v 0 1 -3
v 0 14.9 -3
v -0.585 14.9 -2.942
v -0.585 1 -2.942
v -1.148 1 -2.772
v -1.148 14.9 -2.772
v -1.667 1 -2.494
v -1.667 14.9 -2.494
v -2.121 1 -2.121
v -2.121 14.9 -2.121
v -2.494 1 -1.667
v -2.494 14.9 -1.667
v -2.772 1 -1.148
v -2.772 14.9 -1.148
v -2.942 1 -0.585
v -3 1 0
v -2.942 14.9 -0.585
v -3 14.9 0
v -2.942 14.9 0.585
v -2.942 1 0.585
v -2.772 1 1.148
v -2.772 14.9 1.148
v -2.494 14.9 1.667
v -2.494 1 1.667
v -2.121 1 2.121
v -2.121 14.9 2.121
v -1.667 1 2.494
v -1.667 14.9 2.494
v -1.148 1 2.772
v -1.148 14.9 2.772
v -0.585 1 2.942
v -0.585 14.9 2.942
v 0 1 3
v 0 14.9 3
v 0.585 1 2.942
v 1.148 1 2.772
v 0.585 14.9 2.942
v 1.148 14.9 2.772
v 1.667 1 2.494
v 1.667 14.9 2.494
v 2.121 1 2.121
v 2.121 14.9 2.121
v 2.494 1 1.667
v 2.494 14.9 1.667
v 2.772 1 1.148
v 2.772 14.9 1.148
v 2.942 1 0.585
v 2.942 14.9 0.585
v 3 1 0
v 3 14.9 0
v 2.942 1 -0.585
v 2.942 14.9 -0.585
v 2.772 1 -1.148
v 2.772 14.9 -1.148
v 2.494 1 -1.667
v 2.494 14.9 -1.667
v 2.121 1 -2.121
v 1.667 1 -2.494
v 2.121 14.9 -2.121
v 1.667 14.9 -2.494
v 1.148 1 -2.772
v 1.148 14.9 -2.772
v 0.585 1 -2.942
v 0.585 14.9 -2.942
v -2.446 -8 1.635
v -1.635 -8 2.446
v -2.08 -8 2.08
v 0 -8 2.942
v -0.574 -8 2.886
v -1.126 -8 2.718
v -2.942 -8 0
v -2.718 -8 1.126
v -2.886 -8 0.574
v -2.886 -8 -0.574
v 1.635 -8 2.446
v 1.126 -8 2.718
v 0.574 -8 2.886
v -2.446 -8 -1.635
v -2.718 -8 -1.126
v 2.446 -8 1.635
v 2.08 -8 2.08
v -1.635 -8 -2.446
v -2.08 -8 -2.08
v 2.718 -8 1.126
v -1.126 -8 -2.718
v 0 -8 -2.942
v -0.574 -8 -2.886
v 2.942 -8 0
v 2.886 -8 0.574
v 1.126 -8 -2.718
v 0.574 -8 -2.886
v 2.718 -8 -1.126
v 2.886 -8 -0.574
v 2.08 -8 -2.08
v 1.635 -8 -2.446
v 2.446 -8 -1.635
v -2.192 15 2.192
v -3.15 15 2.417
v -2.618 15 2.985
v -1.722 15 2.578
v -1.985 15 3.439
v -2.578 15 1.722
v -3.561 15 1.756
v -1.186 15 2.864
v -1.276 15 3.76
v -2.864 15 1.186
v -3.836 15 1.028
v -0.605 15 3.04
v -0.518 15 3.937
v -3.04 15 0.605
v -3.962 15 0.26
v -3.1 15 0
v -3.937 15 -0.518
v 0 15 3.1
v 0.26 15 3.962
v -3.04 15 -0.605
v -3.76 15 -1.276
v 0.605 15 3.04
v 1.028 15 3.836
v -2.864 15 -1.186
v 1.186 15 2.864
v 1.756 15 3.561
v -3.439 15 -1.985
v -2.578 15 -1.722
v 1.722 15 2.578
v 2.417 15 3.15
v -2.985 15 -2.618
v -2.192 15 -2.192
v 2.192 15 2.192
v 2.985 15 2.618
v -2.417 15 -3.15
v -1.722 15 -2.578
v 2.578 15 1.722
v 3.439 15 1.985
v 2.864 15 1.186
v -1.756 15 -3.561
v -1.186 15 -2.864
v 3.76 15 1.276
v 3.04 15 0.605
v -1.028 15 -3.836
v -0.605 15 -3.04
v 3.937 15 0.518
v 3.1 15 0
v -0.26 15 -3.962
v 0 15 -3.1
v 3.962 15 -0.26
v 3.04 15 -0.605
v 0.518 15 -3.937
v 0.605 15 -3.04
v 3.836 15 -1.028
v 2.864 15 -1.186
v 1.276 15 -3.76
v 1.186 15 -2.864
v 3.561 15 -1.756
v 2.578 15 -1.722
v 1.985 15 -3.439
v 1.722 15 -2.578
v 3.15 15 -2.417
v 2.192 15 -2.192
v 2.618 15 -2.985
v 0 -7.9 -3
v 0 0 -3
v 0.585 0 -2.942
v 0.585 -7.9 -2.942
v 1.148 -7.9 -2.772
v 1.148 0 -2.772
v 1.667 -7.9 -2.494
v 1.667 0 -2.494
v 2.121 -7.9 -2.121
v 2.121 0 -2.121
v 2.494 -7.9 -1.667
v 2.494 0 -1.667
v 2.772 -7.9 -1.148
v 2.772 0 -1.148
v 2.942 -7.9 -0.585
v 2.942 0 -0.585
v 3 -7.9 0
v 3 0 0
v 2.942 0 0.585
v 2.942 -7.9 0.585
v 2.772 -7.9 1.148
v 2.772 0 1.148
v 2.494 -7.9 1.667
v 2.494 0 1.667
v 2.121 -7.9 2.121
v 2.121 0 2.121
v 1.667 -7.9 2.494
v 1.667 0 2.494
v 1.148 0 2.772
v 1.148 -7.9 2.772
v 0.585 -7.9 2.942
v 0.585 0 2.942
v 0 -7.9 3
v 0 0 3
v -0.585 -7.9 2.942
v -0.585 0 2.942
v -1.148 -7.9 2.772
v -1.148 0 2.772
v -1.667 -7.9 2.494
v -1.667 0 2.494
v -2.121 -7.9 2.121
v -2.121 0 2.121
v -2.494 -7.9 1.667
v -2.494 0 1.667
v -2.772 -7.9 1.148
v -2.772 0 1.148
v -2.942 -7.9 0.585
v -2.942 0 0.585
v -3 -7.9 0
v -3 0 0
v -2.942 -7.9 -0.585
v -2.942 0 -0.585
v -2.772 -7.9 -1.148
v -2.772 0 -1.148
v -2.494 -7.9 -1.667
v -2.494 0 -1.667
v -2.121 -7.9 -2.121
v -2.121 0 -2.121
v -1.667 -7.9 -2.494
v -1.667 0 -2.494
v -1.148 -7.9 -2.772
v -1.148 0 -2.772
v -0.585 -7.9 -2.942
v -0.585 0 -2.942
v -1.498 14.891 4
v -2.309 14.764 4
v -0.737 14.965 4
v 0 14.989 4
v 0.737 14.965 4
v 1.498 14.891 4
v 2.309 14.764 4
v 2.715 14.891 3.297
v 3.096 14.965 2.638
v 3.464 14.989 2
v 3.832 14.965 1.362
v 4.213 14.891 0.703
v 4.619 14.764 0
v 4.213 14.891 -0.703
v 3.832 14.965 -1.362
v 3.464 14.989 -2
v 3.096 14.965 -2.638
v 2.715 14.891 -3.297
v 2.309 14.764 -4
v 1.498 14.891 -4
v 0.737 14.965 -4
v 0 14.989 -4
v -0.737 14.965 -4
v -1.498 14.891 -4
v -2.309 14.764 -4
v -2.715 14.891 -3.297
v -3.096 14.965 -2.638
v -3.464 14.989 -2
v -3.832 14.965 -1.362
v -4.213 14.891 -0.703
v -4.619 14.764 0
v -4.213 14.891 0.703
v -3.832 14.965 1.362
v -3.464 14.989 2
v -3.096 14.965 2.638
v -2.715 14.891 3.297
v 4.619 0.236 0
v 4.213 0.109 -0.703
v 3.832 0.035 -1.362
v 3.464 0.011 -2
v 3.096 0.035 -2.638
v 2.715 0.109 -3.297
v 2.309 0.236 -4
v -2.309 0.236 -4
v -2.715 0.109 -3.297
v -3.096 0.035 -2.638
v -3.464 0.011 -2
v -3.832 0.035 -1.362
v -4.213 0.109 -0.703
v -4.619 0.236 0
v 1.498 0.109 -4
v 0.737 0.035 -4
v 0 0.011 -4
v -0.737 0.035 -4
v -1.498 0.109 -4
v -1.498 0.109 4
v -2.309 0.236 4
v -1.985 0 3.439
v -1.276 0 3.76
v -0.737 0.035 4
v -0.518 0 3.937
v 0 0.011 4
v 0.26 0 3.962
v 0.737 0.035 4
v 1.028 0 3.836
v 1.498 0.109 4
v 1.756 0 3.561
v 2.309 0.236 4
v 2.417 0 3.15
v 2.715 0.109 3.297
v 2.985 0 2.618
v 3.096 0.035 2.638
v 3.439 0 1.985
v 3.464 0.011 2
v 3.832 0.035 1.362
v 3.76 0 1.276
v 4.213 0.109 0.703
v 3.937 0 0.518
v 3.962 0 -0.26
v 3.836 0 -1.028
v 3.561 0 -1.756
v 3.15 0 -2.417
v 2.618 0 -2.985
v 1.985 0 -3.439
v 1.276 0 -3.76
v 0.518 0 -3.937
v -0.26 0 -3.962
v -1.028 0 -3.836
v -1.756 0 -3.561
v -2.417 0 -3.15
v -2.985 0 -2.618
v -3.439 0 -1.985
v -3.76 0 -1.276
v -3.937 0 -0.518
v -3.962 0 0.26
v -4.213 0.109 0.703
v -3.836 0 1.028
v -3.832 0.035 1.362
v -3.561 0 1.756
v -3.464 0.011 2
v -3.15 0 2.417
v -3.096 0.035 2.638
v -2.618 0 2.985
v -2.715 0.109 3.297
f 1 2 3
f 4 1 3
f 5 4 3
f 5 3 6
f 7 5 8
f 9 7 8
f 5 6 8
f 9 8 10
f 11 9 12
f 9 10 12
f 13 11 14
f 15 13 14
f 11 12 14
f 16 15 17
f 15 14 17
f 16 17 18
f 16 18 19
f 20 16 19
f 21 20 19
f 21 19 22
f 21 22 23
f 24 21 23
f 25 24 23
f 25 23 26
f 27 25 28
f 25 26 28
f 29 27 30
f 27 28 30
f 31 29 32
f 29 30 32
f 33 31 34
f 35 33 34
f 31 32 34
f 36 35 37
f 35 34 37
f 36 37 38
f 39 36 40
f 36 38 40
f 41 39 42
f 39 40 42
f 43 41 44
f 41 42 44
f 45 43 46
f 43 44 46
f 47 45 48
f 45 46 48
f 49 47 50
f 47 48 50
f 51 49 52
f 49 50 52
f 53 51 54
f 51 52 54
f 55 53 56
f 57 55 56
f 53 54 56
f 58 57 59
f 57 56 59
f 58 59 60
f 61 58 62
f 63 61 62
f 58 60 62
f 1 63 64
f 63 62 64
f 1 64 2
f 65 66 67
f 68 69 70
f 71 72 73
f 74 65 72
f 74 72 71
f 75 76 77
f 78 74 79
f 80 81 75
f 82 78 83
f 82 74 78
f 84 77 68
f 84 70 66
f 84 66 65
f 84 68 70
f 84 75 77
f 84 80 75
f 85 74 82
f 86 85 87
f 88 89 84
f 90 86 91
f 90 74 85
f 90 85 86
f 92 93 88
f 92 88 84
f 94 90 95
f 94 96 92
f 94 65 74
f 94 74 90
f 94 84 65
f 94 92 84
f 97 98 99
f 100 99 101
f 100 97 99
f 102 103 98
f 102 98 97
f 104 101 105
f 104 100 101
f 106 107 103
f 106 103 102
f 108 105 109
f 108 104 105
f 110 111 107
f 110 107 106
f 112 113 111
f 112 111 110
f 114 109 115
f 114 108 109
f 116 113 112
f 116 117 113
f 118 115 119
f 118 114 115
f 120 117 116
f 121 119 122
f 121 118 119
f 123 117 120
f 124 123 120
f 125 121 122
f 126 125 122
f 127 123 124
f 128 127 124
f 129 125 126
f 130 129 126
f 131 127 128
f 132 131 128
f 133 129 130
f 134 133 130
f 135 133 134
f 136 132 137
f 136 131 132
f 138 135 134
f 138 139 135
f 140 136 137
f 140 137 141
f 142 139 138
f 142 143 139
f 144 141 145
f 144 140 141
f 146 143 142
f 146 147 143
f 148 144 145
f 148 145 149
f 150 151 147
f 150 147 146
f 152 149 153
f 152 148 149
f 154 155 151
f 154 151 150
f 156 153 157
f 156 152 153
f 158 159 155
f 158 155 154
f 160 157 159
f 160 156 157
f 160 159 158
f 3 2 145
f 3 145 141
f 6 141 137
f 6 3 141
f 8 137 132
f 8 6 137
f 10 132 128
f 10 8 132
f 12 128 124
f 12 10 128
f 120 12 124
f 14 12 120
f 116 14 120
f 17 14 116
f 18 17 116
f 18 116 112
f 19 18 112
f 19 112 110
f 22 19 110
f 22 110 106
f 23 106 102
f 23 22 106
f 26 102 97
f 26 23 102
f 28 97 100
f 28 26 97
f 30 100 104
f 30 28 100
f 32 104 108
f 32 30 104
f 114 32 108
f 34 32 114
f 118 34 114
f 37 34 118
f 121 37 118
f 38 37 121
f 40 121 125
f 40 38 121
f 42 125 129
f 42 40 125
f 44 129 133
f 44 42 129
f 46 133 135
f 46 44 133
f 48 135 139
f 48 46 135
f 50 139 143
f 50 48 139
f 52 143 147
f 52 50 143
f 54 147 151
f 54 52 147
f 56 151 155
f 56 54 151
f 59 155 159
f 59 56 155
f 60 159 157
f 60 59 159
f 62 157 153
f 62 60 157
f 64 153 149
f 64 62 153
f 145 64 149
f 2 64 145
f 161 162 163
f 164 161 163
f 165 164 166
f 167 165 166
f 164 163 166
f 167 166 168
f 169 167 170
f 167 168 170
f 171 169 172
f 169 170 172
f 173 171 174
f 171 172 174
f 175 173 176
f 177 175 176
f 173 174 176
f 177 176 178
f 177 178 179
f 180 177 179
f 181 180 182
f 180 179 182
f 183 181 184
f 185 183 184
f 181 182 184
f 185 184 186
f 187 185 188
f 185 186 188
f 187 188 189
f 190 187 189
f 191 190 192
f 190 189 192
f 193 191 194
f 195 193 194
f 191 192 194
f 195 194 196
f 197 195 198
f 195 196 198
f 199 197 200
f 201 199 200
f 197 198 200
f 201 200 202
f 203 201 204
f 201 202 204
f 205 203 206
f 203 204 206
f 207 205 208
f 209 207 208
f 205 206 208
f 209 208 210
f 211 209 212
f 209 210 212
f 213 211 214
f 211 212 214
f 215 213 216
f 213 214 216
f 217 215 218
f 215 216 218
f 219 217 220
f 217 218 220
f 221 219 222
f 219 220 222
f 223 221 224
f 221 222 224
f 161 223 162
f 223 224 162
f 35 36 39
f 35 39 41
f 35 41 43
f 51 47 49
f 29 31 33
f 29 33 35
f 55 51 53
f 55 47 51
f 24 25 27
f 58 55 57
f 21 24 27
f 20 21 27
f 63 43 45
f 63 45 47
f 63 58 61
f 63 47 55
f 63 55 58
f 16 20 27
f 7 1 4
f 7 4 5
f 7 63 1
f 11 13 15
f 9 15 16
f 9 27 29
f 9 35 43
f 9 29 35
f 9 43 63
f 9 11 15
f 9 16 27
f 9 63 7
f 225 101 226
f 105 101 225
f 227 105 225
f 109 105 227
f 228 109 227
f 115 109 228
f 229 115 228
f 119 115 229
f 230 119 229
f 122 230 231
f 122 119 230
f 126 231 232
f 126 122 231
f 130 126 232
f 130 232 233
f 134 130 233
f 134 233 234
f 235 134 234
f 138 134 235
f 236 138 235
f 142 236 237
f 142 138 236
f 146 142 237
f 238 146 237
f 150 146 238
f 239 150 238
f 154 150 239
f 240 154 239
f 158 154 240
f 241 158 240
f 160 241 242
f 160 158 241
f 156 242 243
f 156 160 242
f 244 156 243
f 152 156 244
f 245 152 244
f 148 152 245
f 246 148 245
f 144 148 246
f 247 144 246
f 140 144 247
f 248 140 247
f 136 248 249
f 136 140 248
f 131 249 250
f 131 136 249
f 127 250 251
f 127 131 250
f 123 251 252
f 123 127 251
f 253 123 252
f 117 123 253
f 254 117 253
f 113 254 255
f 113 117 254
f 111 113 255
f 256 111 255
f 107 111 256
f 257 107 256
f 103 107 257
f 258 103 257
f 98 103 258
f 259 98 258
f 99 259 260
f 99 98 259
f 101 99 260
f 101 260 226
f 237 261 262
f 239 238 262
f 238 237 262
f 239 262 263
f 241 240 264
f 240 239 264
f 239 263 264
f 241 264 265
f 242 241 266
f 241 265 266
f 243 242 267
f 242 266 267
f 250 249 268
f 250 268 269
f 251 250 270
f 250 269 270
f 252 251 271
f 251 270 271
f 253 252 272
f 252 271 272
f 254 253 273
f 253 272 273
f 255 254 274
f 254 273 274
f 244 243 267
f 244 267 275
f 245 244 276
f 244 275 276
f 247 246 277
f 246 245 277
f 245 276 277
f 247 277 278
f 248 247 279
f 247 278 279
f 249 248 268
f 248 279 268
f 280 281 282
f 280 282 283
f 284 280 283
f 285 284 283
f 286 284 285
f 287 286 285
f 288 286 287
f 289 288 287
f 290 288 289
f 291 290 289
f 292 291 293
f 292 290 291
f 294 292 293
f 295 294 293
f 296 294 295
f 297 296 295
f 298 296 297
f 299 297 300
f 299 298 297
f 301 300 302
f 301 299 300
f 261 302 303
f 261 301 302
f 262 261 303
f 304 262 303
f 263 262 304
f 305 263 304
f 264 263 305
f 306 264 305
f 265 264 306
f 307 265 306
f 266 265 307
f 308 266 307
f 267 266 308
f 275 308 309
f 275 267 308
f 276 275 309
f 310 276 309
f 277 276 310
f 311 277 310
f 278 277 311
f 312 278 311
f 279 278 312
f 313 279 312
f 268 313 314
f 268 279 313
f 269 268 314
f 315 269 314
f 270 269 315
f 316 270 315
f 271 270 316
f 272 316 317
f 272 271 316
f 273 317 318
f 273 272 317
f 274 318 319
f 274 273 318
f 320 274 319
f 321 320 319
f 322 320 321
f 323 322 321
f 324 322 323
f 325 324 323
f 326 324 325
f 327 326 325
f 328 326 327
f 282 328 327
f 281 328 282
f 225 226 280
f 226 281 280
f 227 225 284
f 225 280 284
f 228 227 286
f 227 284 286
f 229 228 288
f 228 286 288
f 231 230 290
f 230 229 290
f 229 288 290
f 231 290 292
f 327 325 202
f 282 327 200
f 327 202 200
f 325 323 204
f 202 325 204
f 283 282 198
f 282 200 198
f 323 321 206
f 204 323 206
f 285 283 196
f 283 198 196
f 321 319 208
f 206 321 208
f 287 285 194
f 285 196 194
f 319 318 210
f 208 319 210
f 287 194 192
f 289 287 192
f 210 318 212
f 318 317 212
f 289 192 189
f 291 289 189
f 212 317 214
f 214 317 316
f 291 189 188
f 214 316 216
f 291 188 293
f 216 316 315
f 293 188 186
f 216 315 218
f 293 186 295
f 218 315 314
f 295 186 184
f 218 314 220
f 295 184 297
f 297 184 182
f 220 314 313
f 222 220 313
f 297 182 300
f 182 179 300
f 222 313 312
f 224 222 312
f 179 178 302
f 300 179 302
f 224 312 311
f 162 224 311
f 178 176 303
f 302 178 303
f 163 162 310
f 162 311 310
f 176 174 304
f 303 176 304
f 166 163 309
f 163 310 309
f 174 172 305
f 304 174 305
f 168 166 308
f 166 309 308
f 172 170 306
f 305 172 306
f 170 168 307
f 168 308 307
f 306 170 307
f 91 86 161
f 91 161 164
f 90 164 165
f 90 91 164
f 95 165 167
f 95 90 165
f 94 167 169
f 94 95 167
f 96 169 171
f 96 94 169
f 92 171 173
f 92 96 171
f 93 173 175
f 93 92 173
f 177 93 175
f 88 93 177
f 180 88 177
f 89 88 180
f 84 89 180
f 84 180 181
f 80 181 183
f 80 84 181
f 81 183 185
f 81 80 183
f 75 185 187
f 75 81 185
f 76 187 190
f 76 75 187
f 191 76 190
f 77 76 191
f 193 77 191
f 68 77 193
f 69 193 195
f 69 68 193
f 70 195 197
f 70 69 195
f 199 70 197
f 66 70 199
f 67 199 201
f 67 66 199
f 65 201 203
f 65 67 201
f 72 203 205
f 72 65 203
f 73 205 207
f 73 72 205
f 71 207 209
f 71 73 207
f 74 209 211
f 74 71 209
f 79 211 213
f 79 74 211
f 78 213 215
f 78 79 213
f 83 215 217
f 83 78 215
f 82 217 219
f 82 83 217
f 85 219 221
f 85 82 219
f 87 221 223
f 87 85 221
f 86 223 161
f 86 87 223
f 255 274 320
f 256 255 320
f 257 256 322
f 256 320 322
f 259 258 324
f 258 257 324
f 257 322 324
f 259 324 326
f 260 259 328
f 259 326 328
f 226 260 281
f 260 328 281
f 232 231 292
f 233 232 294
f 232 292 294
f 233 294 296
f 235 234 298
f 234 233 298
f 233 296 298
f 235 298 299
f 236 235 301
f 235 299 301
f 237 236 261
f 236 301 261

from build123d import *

# Parameters (mm, degrees)
EXTRUDE_1_DEPTH     = 15
SKETCH_2_R          = 3
EXTRUDE_2_DEPTH     = 8
SKETCH_3_R          = 3
CUT_EXTRUDE_1_DEPTH = 14
CHAMFER_1_SIZE      = 0.1
CHAMFER_1_SIZE2     = 0.057735027
CHAMFER_2_SIZE      = 0.1


with BuildPart() as part:
    # 草图1 → 凸台-拉伸1 (new body)
    with BuildSketch(Plane(origin=(0, 0, 0), x_dir=(1, 0, 0), z_dir=(0, 1, 0))):
        Polygon((2.309401077, 4), (-2.309401077, 4), (-4.618802154, 0), (-2.309401077, -4), (2.309401077, -4), (4.618802154, 0), align=None)
    extrude(amount=EXTRUDE_1_DEPTH)

    # 草图2 → 凸台-拉伸2 (add)
    with BuildSketch(Plane.XZ):
        with Locations(Location((0, 0, 0), (0, 0, 270))):
            Circle(SKETCH_2_R)
    extrude(amount=EXTRUDE_2_DEPTH)

    # 草图3 → 切除-拉伸1 (cut)
    with BuildSketch(Plane(origin=(0, 15, 0), x_dir=(1, 0, 0), z_dir=(0, 1, 0))):
        with Locations(Location((0, 0, 0), (0, 0, 90))):
            Circle(SKETCH_3_R)
    extrude(amount=-CUT_EXTRUDE_1_DEPTH, mode=Mode.SUBTRACT)

    # 草图4 → 切除-旋转1 (revolve, cut)
    with BuildSketch(Plane.XY, mode=Mode.PRIVATE) as cut_revolve_1_sk:
        Polygon((-4.618802154, 0.235852712), (-4.618802154, 0), (-3.970802154, 0), align=None)
        Polygon((-4.618802154, 15), (-4.618802154, 14.764147288), (-3.970802154, 15), align=None)
    revolve(cut_revolve_1_sk.sketch.rotate(Axis((0, -9.15, 0), (0, 1, 0)), 60.000004036), axis=Axis((0, -9.15, 0), (0, 1, 0)), mode=Mode.SUBTRACT)

    # 倒角1
    chamfer_1_edges = [part.edges().sort_by_distance(p)[0] for p in [
        (0, -8, 3),
    ]]
    chamfer_1_side = [part.faces().sort_by_distance(p)[0] for p in [
        (0, -4, 3),
    ]]
    chamfer(chamfer_1_edges, length=CHAMFER_1_SIZE, length2=CHAMFER_1_SIZE2, reference=chamfer_1_side[0])

    # 倒角2
    chamfer_2_edges = [part.edges().sort_by_distance(p)[0] for p in [
        (0, 15, 3),
    ]]
    chamfer(chamfer_2_edges, length=CHAMFER_2_SIZE)


solid = part.part
